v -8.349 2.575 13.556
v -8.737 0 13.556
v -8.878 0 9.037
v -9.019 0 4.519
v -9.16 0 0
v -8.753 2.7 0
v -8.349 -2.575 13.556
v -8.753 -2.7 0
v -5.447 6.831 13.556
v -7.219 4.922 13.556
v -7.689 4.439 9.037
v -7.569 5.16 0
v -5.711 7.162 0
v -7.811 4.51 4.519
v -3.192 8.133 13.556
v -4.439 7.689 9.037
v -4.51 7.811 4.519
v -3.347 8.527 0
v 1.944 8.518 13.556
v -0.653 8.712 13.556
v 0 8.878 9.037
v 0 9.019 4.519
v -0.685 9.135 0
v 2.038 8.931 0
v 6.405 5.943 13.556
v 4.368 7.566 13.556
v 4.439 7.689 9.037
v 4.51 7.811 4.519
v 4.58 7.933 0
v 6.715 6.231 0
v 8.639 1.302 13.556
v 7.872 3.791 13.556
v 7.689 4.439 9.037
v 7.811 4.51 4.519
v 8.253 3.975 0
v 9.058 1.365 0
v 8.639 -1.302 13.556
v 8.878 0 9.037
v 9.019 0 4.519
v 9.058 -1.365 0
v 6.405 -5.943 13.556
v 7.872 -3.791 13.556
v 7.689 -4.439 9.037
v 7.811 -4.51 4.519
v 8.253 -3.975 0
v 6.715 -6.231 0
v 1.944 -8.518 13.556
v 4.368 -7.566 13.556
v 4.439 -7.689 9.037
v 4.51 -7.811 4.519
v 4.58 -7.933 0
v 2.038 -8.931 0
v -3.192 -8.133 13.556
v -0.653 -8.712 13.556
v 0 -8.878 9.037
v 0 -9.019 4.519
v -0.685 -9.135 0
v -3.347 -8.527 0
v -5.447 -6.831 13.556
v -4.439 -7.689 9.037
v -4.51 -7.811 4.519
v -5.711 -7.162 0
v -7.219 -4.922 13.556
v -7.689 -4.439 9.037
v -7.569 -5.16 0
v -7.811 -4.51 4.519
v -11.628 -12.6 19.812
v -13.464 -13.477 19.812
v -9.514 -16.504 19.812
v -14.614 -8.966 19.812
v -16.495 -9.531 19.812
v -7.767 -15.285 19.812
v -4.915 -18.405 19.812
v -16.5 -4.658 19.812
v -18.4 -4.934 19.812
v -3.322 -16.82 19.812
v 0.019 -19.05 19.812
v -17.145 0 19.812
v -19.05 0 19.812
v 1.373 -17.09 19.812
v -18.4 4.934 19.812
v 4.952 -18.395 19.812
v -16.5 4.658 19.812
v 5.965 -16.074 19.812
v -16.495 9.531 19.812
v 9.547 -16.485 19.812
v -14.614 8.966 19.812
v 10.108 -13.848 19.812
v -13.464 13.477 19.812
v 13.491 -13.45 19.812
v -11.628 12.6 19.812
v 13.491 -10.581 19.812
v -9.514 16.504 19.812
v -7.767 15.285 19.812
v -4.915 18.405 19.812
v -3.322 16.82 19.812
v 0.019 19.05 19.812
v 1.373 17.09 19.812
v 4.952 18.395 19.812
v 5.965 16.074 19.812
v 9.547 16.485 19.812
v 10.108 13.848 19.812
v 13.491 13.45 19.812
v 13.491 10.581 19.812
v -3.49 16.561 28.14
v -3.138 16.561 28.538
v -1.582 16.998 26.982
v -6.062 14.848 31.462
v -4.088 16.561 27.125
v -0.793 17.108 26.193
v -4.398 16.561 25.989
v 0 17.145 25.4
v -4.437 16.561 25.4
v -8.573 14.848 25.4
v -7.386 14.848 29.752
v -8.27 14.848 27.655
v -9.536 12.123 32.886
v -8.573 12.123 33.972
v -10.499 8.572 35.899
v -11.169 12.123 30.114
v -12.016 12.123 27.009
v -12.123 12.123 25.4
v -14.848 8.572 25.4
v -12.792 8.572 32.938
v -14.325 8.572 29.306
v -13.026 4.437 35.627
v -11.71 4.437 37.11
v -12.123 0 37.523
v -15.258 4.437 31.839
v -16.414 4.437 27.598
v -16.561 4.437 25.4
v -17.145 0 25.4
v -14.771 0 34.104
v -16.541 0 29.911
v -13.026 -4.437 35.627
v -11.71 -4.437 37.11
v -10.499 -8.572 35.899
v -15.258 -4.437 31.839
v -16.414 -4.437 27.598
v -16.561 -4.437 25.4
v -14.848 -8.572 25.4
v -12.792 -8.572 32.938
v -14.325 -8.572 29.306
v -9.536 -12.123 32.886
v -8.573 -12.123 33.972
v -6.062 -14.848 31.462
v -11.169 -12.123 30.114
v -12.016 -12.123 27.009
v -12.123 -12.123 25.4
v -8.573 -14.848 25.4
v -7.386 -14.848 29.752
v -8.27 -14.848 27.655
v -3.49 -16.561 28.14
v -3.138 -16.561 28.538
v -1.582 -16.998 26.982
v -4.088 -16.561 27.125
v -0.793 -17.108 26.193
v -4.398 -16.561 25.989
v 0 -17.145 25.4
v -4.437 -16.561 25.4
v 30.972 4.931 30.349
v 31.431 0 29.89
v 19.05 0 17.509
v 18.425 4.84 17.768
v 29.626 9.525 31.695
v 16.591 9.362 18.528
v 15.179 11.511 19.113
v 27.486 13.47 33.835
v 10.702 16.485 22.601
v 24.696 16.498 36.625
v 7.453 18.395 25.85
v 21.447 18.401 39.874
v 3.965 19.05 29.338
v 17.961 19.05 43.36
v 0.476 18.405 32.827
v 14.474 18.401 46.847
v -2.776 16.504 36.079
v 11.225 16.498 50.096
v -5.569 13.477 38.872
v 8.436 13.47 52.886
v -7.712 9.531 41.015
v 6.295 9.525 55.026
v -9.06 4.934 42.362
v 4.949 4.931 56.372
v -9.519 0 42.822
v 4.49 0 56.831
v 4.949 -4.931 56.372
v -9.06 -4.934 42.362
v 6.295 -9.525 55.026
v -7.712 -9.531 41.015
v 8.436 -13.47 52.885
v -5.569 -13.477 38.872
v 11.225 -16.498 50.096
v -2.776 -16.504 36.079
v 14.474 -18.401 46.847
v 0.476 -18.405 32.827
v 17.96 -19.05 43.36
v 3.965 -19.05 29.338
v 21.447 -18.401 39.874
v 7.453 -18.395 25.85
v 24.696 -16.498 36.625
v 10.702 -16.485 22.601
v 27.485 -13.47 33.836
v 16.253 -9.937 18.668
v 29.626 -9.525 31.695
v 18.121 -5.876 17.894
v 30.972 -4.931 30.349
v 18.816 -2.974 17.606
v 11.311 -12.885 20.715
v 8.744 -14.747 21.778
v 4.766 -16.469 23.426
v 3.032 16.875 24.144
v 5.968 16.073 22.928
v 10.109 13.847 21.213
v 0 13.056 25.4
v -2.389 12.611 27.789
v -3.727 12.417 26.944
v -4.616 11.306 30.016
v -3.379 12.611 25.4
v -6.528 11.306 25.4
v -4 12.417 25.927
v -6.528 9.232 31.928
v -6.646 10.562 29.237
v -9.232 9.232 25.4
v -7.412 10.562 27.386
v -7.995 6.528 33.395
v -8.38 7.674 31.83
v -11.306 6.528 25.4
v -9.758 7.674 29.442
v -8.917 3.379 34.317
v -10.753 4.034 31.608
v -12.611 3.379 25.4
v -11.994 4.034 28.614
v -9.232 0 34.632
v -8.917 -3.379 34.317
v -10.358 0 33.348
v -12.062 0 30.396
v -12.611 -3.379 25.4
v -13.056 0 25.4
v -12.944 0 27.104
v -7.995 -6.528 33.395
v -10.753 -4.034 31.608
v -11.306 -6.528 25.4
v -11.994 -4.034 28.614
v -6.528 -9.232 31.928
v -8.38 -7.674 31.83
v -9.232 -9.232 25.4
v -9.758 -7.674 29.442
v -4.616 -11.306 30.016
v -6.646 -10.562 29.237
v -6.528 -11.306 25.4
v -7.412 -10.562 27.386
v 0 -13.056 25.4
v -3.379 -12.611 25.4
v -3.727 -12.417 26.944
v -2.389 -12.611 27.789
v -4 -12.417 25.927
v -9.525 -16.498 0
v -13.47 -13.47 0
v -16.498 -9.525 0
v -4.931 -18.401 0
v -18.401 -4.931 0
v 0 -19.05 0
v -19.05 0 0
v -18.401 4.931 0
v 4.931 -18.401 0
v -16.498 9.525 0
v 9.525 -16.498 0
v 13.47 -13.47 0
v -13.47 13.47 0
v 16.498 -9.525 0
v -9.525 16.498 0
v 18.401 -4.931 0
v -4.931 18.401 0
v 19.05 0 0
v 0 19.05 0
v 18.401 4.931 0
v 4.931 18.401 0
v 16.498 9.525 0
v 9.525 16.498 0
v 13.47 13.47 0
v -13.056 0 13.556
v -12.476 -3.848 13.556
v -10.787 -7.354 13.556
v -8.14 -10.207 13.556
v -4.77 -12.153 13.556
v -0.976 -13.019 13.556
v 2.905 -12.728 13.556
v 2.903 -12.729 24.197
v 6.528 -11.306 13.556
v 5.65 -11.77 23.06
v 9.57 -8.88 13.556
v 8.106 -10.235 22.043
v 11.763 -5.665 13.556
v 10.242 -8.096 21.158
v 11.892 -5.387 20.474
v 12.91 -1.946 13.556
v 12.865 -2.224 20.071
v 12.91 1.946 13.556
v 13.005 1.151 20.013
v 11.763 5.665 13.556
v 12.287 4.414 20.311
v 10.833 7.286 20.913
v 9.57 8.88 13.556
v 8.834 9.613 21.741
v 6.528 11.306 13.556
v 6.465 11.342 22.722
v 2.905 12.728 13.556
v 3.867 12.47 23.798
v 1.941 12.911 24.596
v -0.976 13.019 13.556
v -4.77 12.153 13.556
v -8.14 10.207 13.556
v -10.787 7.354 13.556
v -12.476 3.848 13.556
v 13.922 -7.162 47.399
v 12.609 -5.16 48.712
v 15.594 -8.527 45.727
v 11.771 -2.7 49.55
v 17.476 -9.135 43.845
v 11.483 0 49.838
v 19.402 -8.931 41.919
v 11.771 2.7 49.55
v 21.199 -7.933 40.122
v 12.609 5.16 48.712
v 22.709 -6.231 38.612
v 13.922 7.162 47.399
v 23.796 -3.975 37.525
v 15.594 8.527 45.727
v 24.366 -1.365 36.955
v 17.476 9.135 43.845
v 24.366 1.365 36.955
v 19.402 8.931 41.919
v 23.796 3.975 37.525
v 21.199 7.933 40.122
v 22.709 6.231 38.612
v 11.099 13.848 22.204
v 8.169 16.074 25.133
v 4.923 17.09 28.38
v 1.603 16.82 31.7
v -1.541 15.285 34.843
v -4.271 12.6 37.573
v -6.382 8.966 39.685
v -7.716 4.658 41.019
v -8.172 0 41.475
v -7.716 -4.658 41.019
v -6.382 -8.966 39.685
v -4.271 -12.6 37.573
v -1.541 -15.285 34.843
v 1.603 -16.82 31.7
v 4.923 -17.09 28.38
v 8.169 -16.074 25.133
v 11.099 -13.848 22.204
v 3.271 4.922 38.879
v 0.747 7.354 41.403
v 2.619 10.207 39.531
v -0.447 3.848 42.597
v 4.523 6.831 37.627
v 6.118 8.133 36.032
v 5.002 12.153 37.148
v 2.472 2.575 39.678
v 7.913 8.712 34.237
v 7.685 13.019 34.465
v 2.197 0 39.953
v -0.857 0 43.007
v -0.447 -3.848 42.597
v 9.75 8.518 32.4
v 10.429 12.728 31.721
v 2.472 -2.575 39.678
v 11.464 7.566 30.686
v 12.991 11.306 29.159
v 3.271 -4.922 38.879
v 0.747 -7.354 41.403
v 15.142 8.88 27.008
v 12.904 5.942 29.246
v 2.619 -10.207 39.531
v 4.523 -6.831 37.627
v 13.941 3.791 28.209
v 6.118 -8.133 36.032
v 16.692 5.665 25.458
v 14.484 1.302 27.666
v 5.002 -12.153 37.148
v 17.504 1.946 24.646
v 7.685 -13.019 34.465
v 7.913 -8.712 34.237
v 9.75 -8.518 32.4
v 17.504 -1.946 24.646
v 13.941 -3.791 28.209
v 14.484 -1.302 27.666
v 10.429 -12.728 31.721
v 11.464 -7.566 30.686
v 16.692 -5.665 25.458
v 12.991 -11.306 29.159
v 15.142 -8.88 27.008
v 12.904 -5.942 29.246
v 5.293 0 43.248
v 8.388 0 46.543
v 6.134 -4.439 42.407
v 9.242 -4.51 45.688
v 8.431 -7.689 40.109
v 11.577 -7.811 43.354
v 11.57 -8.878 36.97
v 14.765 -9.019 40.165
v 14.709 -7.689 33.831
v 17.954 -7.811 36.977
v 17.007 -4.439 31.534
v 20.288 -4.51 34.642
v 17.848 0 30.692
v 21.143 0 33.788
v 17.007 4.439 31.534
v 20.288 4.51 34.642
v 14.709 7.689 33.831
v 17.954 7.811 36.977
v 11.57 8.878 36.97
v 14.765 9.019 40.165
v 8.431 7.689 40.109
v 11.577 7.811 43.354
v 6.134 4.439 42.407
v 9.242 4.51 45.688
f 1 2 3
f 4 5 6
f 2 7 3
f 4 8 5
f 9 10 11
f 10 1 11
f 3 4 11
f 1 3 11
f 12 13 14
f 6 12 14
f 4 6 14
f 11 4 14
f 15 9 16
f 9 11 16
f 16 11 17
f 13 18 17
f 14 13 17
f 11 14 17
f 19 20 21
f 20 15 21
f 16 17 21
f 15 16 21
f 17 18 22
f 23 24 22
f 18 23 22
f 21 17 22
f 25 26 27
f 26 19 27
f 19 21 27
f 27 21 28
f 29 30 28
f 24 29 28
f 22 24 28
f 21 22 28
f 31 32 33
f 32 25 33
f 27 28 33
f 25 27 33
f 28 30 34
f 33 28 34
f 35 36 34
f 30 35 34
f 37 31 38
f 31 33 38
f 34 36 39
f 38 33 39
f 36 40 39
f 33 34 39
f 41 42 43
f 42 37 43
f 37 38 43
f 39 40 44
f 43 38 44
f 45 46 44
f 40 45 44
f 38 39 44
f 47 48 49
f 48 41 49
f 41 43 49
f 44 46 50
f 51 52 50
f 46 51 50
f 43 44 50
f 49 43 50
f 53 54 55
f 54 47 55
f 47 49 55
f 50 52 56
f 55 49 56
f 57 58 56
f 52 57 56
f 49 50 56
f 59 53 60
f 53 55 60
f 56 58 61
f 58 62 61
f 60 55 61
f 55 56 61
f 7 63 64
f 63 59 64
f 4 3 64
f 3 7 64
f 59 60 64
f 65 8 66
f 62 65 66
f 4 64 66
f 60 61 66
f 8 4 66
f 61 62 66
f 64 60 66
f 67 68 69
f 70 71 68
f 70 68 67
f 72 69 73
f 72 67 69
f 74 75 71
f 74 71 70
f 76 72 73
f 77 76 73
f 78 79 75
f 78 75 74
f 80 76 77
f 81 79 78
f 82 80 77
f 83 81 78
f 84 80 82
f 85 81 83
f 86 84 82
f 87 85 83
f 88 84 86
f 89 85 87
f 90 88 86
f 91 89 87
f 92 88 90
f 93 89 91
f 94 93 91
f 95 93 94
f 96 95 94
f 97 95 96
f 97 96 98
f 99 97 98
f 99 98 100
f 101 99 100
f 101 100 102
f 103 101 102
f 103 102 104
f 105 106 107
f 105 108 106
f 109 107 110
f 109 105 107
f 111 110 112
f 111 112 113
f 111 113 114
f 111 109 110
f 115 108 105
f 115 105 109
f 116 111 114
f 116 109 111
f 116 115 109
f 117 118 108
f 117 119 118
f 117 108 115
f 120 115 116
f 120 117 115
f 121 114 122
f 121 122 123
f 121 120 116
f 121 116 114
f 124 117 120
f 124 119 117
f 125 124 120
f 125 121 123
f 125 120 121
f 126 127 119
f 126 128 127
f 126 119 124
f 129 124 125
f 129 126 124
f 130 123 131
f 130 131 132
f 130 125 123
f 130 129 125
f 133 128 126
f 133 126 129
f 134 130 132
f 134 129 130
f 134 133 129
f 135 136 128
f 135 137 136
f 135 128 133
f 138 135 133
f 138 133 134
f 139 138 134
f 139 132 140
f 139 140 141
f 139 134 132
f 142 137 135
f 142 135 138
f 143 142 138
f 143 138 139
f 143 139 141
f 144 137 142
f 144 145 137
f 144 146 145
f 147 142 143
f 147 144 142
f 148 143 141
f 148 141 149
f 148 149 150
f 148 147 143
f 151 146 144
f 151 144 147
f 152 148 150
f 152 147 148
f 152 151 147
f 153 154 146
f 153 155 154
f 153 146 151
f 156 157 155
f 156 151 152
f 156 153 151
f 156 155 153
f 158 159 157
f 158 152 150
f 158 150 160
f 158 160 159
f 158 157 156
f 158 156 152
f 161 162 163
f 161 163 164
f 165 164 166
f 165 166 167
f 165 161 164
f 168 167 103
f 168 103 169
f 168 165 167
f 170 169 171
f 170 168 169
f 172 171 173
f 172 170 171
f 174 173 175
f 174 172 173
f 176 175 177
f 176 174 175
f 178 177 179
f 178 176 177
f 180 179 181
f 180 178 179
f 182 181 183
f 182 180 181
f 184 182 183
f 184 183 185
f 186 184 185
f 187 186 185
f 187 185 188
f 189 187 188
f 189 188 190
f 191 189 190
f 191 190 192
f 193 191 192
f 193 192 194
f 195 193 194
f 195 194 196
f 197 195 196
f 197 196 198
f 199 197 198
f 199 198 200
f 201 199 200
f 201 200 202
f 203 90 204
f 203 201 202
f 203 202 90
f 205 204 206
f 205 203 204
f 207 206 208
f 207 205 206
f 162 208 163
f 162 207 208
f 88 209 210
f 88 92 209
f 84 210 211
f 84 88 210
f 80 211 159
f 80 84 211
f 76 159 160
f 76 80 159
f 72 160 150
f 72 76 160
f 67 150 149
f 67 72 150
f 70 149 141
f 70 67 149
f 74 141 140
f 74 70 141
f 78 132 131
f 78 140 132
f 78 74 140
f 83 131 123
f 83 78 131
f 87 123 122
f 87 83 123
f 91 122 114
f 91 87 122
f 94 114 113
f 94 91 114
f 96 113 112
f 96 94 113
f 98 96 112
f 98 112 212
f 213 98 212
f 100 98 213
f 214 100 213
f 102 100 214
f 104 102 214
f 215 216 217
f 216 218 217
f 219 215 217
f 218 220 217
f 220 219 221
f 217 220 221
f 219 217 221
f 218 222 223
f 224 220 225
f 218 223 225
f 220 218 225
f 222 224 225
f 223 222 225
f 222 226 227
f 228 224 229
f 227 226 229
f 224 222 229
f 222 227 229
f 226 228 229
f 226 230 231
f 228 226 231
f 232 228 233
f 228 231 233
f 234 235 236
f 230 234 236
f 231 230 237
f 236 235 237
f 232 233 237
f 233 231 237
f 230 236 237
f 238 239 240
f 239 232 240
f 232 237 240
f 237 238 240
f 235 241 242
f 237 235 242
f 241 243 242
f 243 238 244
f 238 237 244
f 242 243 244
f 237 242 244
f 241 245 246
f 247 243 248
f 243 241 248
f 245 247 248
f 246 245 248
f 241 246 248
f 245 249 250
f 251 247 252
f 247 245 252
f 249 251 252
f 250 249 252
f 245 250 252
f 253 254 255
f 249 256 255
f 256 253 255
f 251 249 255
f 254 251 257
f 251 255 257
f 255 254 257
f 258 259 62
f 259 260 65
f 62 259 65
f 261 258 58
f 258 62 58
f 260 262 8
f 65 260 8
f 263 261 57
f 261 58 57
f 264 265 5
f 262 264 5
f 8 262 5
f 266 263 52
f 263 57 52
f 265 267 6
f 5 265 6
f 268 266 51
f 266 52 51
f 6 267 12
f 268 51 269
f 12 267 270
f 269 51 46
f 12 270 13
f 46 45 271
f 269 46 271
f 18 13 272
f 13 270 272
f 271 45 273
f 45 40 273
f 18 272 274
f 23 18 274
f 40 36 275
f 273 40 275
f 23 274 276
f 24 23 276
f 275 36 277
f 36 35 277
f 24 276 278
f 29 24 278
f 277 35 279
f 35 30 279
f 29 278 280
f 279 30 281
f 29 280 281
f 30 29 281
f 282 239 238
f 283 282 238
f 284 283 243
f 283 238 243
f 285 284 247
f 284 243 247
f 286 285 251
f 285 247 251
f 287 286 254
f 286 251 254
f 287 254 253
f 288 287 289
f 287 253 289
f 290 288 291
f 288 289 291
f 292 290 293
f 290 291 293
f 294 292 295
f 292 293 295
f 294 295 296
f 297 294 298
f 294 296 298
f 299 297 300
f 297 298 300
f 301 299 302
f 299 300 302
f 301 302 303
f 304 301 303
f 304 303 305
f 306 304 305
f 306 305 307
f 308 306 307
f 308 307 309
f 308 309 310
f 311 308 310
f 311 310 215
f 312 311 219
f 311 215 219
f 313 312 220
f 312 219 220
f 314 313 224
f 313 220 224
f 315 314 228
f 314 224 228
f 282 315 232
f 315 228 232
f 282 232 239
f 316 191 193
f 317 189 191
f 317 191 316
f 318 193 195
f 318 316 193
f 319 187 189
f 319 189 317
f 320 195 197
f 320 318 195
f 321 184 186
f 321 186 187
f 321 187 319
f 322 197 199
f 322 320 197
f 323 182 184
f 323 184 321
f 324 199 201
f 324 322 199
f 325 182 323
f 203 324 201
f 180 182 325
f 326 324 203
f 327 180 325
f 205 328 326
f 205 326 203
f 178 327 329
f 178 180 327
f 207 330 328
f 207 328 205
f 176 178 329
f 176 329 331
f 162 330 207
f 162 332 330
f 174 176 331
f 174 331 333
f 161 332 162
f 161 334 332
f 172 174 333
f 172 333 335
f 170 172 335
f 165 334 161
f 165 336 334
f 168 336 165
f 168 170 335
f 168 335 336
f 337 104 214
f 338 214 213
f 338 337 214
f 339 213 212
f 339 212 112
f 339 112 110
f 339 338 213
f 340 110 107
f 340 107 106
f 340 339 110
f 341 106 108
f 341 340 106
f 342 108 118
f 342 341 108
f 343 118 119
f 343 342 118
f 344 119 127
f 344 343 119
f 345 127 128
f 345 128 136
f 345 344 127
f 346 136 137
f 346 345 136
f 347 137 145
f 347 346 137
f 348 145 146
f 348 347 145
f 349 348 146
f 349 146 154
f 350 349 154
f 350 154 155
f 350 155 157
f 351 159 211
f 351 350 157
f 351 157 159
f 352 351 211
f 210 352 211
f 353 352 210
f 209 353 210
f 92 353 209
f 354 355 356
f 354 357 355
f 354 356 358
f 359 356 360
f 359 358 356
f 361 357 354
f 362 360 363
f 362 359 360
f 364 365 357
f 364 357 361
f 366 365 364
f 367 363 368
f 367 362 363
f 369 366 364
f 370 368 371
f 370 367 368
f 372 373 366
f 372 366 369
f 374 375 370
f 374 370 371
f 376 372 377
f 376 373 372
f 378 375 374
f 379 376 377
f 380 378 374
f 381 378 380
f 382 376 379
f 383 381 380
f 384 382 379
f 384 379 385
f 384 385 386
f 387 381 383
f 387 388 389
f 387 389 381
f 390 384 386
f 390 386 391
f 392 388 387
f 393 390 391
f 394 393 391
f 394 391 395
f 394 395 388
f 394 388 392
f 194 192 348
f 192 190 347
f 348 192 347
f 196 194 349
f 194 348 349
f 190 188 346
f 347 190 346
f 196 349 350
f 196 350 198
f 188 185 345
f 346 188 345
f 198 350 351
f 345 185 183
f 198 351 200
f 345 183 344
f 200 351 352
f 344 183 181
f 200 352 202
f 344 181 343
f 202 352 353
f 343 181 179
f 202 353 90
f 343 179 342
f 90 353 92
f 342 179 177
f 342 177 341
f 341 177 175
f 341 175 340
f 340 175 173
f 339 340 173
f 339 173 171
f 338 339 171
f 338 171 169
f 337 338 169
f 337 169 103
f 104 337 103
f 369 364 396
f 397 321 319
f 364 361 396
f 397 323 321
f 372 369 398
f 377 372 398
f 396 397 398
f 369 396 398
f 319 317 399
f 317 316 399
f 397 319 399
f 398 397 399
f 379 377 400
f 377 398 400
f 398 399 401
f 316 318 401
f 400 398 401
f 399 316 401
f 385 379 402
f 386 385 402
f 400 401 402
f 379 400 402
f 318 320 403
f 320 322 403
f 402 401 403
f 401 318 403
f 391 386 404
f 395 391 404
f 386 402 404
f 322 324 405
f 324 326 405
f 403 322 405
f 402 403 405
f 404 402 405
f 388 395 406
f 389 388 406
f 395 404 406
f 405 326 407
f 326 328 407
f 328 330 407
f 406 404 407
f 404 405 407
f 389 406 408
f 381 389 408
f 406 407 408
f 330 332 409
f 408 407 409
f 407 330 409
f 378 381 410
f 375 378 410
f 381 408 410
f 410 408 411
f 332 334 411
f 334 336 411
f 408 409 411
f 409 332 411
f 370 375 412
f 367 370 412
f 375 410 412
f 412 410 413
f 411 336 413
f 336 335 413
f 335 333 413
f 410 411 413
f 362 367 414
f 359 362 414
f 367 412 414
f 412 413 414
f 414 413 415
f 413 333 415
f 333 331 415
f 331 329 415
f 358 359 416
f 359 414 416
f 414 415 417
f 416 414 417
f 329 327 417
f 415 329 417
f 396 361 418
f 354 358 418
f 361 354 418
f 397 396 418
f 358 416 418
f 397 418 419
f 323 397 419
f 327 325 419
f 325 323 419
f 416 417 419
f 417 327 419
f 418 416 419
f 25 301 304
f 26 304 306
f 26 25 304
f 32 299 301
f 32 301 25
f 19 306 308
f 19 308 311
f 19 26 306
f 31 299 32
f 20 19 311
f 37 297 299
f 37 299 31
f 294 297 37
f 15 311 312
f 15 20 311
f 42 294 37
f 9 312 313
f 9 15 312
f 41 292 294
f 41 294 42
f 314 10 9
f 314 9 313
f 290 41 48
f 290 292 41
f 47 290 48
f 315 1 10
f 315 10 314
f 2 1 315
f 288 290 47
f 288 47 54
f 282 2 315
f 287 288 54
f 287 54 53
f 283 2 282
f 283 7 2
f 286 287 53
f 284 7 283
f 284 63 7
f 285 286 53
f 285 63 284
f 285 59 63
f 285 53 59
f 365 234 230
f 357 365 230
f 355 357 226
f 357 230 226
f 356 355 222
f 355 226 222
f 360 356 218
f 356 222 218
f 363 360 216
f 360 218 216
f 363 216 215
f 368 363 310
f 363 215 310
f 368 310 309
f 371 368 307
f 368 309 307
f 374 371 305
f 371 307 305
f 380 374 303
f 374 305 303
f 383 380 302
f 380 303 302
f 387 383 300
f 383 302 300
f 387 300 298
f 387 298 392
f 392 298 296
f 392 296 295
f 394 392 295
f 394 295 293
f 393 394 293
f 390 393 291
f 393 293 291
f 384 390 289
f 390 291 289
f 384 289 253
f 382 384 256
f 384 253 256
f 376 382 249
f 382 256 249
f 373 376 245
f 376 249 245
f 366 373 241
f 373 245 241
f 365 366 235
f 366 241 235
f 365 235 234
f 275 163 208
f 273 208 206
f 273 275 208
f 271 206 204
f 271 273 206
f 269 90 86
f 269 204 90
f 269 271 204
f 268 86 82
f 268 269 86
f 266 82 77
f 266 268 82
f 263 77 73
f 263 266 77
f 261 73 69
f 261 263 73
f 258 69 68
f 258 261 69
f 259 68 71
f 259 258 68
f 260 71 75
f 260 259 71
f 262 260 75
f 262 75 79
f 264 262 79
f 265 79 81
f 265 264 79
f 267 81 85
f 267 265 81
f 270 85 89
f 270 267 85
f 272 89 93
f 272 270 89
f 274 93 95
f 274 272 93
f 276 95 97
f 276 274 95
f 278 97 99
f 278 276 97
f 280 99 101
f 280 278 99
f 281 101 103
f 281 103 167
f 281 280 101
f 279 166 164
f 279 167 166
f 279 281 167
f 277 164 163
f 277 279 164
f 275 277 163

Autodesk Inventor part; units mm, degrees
ref_plane "YZ Plane" through (0, 0, 0) normal (1, 0, 0) x (0, 1, 0)
sketch "Sketch1" plane through (0, 0, 0) normal (0, 1, 0) x (-1, 0, 0)
  line L0 (0, 0) -> (0, 25.4)
  line L1 (0, 25.4) -> (-17.9605, 43.3605)
  line L2 (-17.9605, 43.3605) -> (-30.0839, 31.2372) construction
  line L3 (-30.0839, 31.2372) -> (-12.1233, 13.2767) construction
  line L4 (0, 25.4) -> (-12.1233, 13.2767) construction
  line L5 (0, 25.4) -> (-17.145, 25.4) construction
  line L6 (-17.145, 25.4) -> (-17.145, 0) construction
  line L7 (0, 0) -> (-17.145, 0) construction
  line L8 (-17.145, 18.2983) -> (0, 25.4) construction
  line L9 (-17.145, 18.2983) -> (0, 18.2983) construction
  line L10 (-17.145, 18.2983) -> (-5.0217, 30.4217) construction
  line L11 (-17.9605, 43.3605) -> (-11.4831, 49.8379)
  line L12 (-11.4831, 49.8379) -> (-2.1972, 39.9528)
  line L13 (-2.1972, 39.9528) -> (0.8567, 43.0067)
  line L14 (0.8567, 43.0067) -> (9.2317, 34.6317)
  line L15 (0, 25.4) -> (9.2317, 34.6317)
  line L16 (-2.1972, 39.9528) -> (-8.375, 33.775) construction
  line L17 (0, 0) -> (9.1604, 0)
  line L18 (9.1604, 0) -> (8.7368, 13.556)
  line L19 (8.7368, 13.556) -> (13.0556, 13.556)
  line L20 (13.0556, 13.556) -> (13.0556, 25.4)
  line L21 (0, 25.4) -> (13.0556, 25.4)
  line L22 (8.7368, 13.556) -> (0, 13.556) construction
  dimension "d0" = 25.4
  dimension "d1" = 25.4
  dimension "d2" = 135
  dimension "d3" = 34.29
  dimension "d4" = 34.29
  dimension "d5" = 18.3208
  dimension "d6" = 26.1112
  dimension "d7" = 13.556
  dimension "d8" = 1.79
  dimension "d9" = 18.3208
  dimension "d10" = 26.1112
  dimension "d11" = 13.556
  dimension "d12" = 1.79
ref_plane "Work Plane1" through (17.9605, 0, 43.3605) normal (0.7071068, 0, 0.7071068) x (0.7071068, 0, -0.7071068)
ref_plane "Work Plane2" through (0, 0, 0) normal (0, 0, 1) x (1, 0, 0)
sketch "Sketch2" plane through (17.9605, 0, 43.3605) normal (0.7071068, 0, 0.7071068) x (0.7071068, 0, -0.7071068)
  circle A0 centre (0, 0) radius 17.145
  line L0 (0, 0) -> (17.145, 0) projected
  circle A1 centre (0, 0) radius 19.05
  dimension "d15" = 34.29
  dimension "d18" = 38.1
extrude "Extrude1" add sketch "Sketch2" against normal blind 25.4 contours A0
extrude "Extrude2" add sketch "Sketch2" against normal blind 19.812
sketch "Sketch3" plane through (0, 0, 0) normal (0, 0, 1) x (1, 0, 0)
  line L0 (0, 0) -> (17.145, 0) projected
  circle A0 centre (0, 0) radius 17.145
  circle A1 centre (0, 0) radius 19.05
  dimension "d22" = 34.29
  dimension "d25" = 38.1
extrude "Extrude3" add sketch "Sketch3" along normal blind 25.4 contours A0
extrude "Extrude4" add sketch "Sketch3" along normal blind 19.812
revolve "Revolve1" cut sketch "Sketch1" angle 360 about axis through (0, 0, 25.4) along (0.7071068, 0, 0.7071068) contours L1 L11 L12 L13 L14 L15
revolve "Revolve2" cut sketch "Sketch1" angle 360 about axis through (0, 0, 0) along (0, 0, 1) contours L0 L21 L20 L19 L18 L17
sketch "Sketch4" plane through (0, 0, 25.4) normal (0, 0, 1) x (1, 0, 0)
  arc A0 (0, 13.0556) -> (0, -13.0556) centre (0, 0) ccw projected
  line L0 (0, 17.145) -> (0, 13.0556) projected
  arc A1 (0, 17.145) -> (0, -17.145) centre (0, 0) ccw projected
  line L1 (0, -13.0556) -> (0, -17.145) projected
  arc A2 (0, 17.145) -> (0, -17.145) centre (0, 0) ccw
  arc A3 (0, 13.0556) -> (0, -13.0556) centre (0, 0) ccw
  line L2 (0, 13.0556) -> (0, -13.0556) construction
  line L3 (0, -13.0556) -> (0, -17.145)
  line L4 (0, 13.0556) -> (0, 17.145)
  dimension "d29" = 17.145
  dimension "d30" = 13.0556
revolve "Revolve3" add sketch "Sketch4" angle 45 about axis through (0, -13.0556, 25.4) along (0, 1, 0)
thread "Filetage1" size "1/2" designation "1/2 - 14 NPT" standard "NPT" full length
thread "Filetage2" size "1/2" designation "1/2 - 14 NPT" standard "NPT" full length
equation "\"d0\" = C1"
equation "\"d1\" = C1"
equation "\"d3\" = 0.9 * H"
equation "\"d4\" = 0.9 * H"
equation "\"d5\" = MD"
equation "\"d6\" = 0.9 * H - 2 * G"
equation "\"d7\" = L2"
equation "\"d9\" = MD"
equation "\"d10\" = 0.9 * H - 2 * G"
equation "\"d11\" = L2"
equation "\"d15\" = 0.9 * H"
equation "\"d18\" = H"
equation "\"d16\" = C1"
equation "\"d19\" = 0.78 * C1"
equation "\"d22\" = 0.9 * H"
equation "\"d25\" = H"
equation "\"d23\" = C1"
equation "\"d26\" = 0.78 * C1"
equation "\"d29\" = 0.45 * H"
equation "\"d30\" = 0.45 * H - G"
equation "\"C1\" = 25.4"
equation "\"H\" = 38.1"
equation "\"G\" = 4.0894"
equation "\"L2\" = 13.55598"
equation "\"MD\" = 18.32077"
equation "\"A\" = 33.274"
equation "\"Size_Designation\" = 0.5"
properties part number "ASME B16.11 Coude 45 deg taraudé - Catégorie 3000 1/2" material "Steel"
